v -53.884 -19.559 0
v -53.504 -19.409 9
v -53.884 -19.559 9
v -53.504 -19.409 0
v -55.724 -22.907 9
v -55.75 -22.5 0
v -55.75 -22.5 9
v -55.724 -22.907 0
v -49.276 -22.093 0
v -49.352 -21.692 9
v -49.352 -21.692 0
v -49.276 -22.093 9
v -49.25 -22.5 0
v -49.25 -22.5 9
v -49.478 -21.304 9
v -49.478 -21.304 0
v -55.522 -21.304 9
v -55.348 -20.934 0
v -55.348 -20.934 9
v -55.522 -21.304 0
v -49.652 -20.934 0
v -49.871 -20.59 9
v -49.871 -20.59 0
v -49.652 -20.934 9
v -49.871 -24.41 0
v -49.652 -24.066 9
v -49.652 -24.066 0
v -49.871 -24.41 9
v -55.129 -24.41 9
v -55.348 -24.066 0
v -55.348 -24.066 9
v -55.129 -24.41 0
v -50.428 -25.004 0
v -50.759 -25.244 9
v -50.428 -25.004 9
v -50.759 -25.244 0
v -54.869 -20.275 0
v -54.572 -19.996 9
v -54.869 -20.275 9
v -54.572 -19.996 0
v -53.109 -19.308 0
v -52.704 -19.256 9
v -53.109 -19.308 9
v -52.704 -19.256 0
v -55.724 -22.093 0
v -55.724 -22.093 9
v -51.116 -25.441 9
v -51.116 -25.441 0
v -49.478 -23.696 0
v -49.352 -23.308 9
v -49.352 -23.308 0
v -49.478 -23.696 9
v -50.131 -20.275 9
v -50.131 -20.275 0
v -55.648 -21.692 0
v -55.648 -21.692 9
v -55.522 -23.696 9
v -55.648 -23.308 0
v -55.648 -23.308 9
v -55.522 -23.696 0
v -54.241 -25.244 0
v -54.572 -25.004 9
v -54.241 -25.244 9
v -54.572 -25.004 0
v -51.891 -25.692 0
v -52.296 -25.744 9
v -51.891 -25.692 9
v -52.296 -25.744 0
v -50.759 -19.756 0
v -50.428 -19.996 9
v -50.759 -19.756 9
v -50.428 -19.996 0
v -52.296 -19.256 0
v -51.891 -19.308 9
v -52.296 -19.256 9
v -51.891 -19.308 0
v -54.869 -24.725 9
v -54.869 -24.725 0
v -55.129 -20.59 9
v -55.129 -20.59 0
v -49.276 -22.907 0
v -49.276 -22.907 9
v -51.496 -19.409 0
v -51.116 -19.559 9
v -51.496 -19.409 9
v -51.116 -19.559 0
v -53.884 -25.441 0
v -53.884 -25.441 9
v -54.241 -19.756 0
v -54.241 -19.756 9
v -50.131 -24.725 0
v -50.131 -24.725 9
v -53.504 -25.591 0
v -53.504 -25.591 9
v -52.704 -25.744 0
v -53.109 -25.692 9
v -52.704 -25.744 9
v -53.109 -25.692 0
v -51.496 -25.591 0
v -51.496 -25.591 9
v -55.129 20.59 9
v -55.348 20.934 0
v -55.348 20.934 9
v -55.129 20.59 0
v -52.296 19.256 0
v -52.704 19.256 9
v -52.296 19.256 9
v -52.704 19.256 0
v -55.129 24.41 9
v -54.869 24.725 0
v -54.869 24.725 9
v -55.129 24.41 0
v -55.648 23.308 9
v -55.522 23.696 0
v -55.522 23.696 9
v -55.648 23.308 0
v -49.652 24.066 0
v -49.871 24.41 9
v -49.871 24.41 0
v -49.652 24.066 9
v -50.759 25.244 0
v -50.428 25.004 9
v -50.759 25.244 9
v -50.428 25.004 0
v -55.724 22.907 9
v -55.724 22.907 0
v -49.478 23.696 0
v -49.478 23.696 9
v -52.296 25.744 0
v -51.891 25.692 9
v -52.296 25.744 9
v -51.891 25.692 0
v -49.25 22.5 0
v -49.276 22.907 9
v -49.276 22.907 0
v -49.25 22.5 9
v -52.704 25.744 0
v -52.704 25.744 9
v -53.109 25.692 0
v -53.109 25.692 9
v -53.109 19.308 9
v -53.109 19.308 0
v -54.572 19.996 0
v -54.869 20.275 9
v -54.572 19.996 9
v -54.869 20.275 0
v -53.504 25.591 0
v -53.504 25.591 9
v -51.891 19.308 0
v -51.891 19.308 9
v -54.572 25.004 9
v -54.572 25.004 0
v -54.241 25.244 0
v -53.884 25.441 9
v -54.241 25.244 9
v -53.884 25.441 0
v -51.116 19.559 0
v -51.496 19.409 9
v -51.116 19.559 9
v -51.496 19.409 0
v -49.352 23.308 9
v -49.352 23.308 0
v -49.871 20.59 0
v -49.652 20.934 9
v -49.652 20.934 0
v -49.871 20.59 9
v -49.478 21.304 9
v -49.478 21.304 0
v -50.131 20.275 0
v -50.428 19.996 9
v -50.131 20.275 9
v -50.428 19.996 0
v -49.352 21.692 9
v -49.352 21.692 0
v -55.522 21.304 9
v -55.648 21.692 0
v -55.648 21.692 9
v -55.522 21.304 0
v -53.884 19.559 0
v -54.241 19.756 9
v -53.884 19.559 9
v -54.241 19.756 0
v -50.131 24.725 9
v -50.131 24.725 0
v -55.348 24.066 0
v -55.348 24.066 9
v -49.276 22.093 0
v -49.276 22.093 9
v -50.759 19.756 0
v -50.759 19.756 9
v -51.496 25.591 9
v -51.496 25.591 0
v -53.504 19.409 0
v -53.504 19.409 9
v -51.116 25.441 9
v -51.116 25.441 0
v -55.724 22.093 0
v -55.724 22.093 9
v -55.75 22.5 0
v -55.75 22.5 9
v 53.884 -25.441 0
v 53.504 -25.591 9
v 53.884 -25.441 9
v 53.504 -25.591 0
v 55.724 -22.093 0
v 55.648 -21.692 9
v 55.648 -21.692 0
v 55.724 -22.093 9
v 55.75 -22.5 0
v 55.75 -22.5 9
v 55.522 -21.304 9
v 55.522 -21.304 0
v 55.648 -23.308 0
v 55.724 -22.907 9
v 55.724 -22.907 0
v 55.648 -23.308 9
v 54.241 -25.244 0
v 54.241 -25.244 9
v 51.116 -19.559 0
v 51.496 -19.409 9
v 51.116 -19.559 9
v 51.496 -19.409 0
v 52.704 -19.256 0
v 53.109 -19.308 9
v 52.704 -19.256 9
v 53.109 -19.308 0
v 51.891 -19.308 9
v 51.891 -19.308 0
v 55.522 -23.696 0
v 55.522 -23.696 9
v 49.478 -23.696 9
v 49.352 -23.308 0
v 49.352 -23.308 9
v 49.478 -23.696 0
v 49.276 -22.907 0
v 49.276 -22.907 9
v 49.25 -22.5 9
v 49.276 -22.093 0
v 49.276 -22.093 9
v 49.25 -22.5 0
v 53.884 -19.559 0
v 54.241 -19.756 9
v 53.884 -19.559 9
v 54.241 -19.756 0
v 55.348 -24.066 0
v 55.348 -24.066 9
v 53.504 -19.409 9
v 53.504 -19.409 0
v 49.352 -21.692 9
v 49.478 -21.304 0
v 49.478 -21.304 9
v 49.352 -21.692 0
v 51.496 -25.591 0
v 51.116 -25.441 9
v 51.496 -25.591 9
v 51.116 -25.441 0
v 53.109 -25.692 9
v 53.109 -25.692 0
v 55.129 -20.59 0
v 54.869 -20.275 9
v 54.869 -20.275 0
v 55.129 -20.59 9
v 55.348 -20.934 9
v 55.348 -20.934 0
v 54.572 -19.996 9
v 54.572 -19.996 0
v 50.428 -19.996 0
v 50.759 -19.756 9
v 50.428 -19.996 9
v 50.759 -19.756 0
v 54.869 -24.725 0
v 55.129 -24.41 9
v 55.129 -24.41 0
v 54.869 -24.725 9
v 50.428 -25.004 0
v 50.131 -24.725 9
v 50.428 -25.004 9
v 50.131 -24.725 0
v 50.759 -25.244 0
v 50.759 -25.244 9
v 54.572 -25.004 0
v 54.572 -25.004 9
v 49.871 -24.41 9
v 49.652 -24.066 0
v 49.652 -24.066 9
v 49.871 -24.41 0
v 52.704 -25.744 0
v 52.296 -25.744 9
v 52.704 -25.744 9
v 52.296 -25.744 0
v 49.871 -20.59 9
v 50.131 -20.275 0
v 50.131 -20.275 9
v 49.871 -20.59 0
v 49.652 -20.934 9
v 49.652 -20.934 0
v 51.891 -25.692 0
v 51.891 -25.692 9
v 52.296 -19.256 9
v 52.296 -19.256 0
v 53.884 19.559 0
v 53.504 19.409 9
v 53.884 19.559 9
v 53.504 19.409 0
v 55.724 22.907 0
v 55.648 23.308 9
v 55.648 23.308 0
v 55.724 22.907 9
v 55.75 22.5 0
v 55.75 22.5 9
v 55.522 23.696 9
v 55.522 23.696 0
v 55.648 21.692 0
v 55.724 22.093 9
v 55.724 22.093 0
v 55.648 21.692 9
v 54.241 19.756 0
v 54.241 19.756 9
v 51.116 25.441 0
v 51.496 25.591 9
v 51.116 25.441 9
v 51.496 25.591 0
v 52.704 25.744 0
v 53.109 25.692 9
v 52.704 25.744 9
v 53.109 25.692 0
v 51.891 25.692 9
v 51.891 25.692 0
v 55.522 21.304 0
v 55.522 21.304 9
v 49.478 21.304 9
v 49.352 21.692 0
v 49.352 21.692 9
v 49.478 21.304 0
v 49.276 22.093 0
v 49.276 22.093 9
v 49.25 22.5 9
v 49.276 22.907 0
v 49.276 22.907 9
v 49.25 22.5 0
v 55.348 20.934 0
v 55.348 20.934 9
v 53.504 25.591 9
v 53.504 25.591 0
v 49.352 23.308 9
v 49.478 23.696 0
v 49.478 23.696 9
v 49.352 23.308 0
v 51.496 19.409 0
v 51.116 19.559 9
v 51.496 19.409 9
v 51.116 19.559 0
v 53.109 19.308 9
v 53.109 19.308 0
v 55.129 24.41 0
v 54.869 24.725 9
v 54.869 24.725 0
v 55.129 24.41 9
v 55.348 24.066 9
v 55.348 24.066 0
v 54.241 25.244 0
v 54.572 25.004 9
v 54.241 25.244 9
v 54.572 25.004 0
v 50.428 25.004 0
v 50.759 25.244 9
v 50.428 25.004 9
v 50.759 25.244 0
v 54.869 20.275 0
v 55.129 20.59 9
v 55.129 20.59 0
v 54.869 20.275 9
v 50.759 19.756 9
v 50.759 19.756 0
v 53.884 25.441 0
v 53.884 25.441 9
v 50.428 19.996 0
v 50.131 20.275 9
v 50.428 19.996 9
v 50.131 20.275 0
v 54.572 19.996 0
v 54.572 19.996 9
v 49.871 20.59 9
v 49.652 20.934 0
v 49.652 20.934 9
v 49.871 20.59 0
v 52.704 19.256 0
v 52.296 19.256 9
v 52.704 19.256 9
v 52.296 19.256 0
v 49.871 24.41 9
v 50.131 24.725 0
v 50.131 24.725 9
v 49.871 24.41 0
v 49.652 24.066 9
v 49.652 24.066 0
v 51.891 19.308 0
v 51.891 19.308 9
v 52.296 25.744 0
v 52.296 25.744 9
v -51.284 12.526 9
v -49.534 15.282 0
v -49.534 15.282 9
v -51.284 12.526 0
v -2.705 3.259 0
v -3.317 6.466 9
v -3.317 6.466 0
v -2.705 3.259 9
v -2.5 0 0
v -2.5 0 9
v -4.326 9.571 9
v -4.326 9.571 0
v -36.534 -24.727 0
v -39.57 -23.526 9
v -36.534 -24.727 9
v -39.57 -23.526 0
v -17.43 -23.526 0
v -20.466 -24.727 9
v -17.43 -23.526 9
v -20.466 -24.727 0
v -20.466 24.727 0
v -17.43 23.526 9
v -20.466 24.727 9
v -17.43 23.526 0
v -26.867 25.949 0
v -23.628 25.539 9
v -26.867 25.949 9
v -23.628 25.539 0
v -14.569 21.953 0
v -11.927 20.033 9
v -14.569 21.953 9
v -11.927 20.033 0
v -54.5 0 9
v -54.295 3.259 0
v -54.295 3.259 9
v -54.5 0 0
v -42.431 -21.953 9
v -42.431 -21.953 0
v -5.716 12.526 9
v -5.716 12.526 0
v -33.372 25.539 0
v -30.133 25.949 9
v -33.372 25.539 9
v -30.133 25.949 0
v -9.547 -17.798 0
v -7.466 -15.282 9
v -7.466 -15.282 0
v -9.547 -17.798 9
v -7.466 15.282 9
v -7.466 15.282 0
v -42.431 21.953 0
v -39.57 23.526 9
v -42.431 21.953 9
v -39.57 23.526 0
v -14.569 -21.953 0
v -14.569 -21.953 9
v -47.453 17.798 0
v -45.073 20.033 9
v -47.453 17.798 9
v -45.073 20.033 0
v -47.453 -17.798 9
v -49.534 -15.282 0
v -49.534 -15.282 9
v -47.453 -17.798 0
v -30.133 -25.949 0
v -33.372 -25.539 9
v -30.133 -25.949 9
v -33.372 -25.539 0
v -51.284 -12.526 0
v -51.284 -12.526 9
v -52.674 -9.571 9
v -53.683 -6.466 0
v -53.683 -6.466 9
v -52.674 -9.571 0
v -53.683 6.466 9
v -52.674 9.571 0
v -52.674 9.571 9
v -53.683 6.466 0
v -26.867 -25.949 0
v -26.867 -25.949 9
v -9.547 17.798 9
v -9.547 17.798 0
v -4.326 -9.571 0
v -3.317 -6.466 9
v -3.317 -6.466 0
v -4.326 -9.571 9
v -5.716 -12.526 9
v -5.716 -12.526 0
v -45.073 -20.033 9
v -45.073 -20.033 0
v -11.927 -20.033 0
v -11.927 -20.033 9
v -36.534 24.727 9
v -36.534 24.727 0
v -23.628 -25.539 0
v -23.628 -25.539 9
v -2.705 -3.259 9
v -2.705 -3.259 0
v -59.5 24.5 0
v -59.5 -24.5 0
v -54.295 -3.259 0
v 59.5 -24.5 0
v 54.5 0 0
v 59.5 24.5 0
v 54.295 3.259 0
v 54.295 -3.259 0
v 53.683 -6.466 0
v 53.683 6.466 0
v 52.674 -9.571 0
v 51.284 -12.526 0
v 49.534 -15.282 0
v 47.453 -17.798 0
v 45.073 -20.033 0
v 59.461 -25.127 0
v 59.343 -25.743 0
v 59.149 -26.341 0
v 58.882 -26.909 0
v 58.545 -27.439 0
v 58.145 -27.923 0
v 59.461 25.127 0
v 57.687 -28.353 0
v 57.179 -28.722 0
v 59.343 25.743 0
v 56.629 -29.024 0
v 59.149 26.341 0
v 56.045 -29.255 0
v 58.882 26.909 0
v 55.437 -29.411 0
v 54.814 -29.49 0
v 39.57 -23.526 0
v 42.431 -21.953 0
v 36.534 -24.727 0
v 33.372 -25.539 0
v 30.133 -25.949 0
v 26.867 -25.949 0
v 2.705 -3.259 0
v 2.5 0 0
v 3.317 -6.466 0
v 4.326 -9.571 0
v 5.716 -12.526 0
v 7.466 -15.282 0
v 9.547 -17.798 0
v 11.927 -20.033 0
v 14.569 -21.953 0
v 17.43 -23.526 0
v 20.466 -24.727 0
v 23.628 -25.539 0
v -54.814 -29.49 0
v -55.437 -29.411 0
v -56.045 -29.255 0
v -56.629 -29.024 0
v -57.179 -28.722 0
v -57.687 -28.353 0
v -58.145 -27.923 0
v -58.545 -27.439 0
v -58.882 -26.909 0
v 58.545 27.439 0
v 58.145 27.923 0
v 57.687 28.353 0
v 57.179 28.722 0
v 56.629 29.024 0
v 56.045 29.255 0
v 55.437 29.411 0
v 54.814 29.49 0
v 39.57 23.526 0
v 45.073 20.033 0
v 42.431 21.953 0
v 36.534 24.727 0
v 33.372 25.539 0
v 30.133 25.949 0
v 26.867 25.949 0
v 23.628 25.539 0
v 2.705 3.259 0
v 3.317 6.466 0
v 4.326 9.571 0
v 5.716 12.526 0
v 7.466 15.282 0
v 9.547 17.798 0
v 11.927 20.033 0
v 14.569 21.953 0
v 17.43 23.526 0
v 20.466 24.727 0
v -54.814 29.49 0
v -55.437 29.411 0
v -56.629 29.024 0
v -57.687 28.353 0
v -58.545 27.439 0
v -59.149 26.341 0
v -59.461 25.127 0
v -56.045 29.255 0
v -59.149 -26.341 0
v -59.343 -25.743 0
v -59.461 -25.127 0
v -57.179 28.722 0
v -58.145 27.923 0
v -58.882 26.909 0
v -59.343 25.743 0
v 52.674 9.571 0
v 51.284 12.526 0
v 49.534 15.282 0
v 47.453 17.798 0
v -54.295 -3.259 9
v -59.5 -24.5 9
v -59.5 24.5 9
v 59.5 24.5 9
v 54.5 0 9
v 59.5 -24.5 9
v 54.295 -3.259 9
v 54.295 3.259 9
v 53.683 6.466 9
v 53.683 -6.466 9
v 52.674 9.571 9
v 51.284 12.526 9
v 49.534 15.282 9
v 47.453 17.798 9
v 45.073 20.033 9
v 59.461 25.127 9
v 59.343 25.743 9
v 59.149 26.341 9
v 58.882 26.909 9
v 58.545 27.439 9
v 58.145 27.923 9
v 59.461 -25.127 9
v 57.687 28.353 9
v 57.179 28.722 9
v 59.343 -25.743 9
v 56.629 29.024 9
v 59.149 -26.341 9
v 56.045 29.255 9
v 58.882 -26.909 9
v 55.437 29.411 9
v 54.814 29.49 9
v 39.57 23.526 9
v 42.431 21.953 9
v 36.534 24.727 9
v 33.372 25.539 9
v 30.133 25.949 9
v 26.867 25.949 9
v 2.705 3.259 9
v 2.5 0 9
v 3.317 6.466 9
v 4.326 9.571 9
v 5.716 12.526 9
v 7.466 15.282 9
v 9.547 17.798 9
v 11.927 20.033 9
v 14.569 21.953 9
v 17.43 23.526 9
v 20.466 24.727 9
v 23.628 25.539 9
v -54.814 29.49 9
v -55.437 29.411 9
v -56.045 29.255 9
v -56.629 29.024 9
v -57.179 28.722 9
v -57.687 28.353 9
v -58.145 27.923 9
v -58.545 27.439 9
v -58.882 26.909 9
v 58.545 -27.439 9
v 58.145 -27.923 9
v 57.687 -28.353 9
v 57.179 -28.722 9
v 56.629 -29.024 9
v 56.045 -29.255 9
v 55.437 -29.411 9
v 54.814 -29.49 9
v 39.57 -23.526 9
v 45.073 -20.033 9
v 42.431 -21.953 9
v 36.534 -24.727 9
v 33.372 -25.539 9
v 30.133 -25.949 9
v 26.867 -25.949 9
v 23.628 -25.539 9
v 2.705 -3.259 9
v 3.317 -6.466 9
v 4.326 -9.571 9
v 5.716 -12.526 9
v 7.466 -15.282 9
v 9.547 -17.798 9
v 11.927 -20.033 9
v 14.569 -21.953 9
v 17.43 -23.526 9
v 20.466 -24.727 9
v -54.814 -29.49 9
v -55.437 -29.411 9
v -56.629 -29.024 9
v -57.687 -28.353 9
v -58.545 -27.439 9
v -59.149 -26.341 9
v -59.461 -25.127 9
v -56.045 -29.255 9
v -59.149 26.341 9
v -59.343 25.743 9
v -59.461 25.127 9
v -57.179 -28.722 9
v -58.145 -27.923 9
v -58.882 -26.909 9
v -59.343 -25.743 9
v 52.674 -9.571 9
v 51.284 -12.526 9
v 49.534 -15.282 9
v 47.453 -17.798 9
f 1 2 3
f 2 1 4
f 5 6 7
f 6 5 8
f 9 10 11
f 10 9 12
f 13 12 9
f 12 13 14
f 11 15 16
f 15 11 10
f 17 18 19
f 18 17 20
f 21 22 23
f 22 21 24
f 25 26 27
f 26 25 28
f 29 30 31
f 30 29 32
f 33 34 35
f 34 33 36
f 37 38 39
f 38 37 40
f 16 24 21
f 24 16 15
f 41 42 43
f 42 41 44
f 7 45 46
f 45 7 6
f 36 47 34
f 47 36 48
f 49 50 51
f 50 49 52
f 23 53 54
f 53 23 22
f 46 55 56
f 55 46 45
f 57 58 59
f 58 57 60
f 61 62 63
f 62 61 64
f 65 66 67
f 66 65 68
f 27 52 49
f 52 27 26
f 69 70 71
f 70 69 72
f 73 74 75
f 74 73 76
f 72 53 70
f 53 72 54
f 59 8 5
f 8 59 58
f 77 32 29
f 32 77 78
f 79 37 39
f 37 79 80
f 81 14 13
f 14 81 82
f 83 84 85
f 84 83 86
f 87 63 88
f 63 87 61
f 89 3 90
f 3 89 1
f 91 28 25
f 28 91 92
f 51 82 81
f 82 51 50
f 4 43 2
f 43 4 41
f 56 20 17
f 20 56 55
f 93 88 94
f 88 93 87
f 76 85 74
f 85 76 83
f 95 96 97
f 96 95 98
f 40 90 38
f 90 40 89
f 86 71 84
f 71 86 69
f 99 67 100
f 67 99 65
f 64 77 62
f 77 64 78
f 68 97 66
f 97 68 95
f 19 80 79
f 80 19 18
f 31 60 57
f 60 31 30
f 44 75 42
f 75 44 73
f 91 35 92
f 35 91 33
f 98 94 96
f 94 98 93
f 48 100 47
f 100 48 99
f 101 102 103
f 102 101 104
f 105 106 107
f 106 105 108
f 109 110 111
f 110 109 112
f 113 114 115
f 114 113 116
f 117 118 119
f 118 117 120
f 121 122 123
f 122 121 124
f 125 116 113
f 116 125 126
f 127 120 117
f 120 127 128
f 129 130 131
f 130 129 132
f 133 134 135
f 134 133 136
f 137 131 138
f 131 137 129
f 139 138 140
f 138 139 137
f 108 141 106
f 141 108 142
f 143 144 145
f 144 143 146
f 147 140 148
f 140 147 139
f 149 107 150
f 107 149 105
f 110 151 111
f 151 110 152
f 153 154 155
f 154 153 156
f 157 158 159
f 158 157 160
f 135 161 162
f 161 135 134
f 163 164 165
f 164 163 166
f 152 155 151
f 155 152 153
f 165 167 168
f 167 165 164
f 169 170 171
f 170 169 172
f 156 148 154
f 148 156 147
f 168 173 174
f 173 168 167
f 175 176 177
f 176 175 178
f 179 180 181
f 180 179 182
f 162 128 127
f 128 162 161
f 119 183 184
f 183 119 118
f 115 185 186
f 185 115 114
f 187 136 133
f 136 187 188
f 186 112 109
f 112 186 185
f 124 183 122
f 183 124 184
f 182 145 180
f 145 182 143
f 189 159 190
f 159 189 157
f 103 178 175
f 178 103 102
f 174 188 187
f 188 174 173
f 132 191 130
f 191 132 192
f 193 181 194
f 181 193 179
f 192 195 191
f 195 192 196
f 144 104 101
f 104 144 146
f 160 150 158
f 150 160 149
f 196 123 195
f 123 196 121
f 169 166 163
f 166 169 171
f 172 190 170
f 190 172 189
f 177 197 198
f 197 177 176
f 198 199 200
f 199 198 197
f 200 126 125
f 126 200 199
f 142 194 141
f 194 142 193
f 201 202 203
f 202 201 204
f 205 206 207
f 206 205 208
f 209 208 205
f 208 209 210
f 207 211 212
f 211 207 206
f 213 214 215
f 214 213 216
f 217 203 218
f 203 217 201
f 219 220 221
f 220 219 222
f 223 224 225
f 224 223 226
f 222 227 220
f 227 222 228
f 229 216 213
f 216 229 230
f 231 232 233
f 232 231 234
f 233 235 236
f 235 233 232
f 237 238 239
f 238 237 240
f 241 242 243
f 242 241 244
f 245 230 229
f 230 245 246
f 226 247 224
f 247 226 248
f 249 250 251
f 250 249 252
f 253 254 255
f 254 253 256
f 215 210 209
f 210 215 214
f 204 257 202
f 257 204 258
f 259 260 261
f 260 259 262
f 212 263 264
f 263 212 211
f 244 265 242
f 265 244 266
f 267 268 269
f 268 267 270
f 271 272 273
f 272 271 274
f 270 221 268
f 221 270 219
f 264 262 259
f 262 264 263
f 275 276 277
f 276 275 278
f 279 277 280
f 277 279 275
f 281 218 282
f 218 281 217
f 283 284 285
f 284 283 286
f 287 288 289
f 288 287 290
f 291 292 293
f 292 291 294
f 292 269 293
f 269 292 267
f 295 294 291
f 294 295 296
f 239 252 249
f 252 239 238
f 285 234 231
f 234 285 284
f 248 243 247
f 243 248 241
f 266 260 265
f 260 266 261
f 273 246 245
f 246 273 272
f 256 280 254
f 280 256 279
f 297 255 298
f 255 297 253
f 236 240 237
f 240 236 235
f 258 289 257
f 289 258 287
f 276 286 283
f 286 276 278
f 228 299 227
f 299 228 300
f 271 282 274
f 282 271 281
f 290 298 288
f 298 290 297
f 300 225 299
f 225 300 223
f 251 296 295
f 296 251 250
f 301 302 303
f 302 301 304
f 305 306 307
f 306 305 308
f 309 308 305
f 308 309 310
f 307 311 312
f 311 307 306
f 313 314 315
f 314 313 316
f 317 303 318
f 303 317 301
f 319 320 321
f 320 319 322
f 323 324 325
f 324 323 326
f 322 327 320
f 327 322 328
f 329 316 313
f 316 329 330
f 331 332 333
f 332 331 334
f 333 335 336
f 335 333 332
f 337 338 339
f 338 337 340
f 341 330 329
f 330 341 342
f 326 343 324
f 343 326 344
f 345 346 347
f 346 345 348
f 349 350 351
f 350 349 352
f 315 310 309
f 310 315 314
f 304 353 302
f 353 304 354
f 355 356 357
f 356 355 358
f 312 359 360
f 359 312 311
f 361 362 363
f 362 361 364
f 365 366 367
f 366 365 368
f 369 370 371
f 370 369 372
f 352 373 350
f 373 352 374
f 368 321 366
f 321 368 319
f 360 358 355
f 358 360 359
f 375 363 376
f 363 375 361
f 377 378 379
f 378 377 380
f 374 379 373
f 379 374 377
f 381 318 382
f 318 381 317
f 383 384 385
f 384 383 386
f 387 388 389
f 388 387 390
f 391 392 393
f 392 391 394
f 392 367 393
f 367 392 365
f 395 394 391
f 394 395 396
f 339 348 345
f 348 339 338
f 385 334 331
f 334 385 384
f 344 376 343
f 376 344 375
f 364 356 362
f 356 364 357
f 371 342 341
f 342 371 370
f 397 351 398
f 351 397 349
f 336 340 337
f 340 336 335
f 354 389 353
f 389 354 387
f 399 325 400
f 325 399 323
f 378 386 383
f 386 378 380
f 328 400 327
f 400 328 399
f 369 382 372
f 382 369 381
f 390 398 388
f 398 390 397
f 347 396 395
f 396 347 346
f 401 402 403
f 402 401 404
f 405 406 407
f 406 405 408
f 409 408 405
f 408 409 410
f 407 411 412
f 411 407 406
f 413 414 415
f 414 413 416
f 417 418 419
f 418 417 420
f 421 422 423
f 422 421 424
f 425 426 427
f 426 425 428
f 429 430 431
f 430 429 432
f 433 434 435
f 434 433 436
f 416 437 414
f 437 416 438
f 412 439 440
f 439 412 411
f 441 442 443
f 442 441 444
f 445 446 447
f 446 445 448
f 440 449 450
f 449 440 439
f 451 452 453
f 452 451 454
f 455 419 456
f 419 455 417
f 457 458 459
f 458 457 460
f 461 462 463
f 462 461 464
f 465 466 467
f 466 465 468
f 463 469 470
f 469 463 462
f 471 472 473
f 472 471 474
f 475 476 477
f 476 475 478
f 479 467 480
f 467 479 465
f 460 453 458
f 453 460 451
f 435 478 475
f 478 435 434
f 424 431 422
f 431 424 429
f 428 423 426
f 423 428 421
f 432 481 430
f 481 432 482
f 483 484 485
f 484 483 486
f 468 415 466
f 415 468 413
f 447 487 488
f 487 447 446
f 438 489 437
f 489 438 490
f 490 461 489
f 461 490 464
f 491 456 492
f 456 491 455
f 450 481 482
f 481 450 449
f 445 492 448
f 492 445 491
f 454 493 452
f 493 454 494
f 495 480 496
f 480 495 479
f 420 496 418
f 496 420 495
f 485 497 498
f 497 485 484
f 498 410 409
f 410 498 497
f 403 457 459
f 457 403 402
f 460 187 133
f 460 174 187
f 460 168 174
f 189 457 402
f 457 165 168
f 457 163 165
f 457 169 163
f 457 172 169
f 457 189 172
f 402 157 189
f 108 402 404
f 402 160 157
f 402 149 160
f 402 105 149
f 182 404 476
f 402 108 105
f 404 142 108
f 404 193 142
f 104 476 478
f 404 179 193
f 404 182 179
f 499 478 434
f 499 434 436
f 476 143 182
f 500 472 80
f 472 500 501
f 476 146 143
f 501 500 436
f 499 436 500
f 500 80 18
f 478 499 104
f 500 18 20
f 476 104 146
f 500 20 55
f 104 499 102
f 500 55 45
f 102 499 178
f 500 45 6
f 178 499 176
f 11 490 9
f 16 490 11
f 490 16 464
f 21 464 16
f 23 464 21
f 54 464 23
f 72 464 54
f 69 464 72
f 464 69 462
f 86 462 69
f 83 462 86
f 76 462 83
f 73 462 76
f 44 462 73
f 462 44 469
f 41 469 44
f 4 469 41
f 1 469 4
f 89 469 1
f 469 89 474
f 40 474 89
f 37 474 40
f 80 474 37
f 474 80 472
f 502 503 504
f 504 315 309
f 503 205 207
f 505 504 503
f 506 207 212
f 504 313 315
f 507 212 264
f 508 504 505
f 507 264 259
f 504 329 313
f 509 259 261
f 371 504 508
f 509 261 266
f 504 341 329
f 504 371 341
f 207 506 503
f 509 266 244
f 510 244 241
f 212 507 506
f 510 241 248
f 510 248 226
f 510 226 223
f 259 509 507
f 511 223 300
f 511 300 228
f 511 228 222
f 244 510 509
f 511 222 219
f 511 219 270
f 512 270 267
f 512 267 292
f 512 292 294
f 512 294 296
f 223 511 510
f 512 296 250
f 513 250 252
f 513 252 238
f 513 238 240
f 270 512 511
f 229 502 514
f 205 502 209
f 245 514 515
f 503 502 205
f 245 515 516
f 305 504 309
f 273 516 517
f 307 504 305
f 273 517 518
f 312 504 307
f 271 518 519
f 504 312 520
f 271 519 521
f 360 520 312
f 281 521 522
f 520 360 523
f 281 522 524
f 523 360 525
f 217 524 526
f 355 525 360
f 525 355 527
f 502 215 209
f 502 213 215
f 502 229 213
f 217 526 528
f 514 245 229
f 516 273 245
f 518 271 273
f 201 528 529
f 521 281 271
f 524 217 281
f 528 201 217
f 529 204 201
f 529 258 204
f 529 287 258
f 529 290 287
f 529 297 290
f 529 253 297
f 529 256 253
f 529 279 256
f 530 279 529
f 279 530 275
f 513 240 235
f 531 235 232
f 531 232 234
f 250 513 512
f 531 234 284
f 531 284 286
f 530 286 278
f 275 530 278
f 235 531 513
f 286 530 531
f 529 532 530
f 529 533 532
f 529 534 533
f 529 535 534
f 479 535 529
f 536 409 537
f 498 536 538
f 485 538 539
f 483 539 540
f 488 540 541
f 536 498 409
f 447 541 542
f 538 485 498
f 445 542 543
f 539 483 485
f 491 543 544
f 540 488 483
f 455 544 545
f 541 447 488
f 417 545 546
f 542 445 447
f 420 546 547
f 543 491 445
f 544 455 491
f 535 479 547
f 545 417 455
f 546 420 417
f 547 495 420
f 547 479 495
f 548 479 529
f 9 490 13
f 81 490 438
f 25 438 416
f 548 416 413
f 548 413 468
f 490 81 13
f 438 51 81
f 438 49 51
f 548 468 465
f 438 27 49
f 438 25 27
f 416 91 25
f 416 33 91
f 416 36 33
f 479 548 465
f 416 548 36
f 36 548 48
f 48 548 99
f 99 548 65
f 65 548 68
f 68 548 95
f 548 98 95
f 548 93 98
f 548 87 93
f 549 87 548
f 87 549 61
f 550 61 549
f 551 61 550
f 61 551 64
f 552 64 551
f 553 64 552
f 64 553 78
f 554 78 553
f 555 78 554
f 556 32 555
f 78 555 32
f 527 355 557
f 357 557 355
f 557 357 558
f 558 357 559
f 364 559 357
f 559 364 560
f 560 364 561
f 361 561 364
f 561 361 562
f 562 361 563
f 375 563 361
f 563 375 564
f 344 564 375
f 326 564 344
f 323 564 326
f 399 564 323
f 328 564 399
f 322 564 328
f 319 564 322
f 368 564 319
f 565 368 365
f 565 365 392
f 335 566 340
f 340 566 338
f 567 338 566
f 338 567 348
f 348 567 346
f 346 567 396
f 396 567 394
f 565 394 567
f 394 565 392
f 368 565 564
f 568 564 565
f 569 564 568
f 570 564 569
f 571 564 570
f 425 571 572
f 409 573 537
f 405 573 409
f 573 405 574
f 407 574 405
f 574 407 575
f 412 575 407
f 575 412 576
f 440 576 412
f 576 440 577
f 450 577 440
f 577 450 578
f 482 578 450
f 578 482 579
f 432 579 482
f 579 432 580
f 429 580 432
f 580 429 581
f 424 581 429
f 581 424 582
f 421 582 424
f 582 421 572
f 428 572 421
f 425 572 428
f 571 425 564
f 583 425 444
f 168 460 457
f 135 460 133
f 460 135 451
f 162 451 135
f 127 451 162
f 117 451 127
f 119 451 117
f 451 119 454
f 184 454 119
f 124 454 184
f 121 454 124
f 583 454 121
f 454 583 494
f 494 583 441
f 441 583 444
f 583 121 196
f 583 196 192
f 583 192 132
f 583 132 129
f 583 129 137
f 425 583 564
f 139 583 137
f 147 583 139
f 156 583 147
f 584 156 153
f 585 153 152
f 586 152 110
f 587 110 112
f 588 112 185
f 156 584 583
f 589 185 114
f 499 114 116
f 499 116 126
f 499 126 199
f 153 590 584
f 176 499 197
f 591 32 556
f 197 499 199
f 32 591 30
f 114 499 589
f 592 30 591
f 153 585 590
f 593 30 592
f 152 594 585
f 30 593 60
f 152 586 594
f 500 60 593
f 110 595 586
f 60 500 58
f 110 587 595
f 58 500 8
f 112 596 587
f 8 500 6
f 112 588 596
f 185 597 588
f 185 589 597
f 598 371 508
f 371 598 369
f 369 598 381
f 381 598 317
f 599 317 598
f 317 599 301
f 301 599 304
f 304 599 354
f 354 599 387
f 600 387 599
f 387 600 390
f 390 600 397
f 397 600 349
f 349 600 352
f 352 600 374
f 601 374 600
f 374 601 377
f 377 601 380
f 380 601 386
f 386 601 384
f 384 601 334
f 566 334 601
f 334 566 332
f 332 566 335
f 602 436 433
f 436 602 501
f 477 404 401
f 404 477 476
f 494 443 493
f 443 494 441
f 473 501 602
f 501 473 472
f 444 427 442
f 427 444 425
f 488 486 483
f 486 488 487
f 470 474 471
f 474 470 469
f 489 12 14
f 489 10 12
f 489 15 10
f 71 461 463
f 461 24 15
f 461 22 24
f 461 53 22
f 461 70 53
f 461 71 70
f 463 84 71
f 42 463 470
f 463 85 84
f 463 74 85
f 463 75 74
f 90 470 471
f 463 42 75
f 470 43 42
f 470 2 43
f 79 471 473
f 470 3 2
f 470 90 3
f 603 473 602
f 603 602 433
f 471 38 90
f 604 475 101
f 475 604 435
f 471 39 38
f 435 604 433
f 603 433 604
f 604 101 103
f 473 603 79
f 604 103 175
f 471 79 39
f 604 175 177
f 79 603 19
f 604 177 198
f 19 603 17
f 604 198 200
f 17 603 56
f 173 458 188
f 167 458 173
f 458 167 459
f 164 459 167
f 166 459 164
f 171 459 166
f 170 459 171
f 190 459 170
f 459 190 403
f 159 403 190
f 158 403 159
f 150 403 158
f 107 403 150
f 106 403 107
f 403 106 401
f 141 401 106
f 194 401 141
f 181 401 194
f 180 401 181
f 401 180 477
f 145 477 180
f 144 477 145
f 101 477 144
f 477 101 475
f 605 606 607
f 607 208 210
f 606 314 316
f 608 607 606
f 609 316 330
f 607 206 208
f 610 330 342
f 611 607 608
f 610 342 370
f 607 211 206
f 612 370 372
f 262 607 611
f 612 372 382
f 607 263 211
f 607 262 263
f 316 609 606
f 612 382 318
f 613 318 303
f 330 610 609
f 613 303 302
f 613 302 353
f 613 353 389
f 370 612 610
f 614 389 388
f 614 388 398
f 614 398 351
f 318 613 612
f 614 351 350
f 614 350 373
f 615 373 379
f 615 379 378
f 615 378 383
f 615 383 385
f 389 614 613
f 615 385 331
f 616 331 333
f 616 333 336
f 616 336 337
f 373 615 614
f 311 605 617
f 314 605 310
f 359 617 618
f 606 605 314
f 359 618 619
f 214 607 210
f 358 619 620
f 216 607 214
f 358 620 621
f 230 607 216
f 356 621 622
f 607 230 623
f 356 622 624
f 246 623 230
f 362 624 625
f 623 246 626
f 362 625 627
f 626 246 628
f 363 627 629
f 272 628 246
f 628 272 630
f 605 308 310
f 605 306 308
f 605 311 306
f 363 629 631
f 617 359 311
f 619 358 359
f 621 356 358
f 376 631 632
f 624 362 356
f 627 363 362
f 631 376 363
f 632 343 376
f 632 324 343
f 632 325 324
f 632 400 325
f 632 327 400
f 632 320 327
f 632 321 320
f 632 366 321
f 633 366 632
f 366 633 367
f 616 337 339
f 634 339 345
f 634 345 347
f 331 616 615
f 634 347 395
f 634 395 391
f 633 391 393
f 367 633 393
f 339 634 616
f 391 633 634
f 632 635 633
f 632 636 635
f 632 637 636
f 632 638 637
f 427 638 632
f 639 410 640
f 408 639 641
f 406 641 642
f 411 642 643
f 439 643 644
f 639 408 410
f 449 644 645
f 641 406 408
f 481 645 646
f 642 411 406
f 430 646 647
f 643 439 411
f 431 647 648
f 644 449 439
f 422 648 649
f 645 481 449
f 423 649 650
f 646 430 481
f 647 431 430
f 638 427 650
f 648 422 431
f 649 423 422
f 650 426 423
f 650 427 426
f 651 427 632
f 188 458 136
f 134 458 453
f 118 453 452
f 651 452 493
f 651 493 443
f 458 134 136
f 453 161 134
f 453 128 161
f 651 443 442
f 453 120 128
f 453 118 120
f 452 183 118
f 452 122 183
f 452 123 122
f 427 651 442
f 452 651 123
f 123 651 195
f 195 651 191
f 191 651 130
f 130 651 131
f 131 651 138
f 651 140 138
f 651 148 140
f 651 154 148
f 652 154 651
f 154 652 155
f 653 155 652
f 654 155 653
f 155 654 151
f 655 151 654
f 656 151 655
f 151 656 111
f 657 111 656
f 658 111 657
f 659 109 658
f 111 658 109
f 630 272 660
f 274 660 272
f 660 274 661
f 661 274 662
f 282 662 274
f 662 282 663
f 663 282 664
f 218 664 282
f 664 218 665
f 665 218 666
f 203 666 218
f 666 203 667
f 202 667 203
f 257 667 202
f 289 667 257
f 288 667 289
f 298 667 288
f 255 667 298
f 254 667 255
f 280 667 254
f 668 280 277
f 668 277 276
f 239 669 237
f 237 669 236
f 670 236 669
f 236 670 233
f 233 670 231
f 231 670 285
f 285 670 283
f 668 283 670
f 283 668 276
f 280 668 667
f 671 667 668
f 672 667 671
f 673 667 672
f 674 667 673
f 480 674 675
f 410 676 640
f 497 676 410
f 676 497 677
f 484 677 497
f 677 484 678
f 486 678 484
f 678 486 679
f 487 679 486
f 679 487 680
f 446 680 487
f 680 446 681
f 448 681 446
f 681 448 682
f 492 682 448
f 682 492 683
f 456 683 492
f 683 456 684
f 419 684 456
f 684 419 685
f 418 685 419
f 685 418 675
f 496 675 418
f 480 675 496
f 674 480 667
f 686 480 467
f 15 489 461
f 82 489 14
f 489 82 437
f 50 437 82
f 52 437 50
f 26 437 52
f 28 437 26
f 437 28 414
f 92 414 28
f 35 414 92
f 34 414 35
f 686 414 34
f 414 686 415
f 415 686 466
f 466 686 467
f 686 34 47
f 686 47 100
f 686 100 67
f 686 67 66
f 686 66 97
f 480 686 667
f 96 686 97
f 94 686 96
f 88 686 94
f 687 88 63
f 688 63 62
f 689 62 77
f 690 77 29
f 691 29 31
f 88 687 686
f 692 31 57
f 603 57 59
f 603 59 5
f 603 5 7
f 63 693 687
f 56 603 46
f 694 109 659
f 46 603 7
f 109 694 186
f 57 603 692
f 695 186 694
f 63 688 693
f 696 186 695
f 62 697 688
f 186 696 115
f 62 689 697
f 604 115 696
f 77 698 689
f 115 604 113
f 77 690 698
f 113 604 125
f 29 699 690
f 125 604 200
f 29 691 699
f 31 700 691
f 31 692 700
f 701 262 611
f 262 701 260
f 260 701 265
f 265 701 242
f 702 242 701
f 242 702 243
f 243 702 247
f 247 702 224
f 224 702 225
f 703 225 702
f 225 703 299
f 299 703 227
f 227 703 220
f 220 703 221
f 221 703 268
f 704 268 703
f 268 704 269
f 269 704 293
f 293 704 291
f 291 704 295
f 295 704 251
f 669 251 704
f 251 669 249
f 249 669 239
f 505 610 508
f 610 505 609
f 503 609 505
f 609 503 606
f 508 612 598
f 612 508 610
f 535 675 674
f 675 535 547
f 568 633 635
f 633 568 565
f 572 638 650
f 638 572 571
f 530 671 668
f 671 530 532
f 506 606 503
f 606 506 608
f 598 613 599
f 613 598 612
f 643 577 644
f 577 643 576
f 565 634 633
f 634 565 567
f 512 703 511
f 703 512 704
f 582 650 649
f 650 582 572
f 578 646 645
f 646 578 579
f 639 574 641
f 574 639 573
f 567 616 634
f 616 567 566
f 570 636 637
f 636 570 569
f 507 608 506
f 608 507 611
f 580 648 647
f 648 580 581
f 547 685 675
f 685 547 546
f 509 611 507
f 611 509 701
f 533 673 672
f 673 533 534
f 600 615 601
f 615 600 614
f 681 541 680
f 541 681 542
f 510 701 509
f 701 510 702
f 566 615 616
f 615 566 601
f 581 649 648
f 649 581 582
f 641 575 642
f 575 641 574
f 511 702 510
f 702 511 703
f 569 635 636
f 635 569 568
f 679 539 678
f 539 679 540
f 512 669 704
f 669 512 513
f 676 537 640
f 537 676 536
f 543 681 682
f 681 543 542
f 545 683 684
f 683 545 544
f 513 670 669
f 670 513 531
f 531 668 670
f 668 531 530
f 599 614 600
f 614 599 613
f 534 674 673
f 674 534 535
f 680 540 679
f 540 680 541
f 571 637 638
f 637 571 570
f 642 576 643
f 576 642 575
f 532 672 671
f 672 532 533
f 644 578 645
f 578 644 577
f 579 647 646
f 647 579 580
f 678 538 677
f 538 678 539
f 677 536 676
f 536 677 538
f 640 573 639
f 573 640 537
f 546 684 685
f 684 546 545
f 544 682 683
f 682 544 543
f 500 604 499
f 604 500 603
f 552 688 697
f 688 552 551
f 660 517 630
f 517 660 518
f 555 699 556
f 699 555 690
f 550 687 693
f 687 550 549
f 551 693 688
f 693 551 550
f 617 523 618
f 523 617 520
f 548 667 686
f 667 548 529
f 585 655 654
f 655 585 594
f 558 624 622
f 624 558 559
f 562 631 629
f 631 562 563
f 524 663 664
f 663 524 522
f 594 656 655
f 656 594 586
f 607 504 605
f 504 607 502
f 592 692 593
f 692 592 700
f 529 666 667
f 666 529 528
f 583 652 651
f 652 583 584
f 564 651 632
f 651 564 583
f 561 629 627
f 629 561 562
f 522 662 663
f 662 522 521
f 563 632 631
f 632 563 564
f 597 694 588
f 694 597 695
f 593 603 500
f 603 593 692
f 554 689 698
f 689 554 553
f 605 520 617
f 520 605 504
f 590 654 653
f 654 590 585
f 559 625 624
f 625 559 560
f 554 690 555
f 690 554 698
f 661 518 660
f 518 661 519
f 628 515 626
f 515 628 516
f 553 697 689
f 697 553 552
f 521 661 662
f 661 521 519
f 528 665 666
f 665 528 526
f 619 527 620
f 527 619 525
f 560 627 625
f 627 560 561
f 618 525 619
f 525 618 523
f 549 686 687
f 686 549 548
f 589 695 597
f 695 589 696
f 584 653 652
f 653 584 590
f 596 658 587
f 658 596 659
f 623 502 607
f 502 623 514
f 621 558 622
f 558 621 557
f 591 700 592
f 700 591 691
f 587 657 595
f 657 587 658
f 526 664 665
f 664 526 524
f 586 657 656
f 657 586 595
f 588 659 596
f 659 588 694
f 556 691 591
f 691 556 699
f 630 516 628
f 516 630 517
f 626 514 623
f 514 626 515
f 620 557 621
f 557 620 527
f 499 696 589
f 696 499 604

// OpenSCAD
$fn = 50;

difference() {
	union() {
		hull() {
			translate(v = [-54.5, 24.5, 0]) {
				cylinder(h = 9, r = 5);
			}
			translate(v = [54.5, 24.5, 0]) {
				cylinder(h = 9, r = 5);
			}
			translate(v = [-54.5, -24.5, 0]) {
				cylinder(h = 9, r = 5);
			}
			translate(v = [54.5, -24.5, 0]) {
				cylinder(h = 9, r = 5);
			}
		}
	}
	union() {
		translate(v = [-52.5, -22.5, -100.0]) {
			cylinder(h = 200, r = 3.25);
		}
		translate(v = [-52.5, 22.5, -100.0]) {
			cylinder(h = 200, r = 3.25);
		}
		translate(v = [52.5, -22.5, -100.0]) {
			cylinder(h = 200, r = 3.25);
		}
		translate(v = [52.5, 22.5, -100.0]) {
			cylinder(h = 200, r = 3.25);
		}
		translate(v = [-52.5, -22.5, -100.0]) {
			cylinder(h = 200, r = 1.8);
		}
		translate(v = [-52.5, 22.5, -100.0]) {
			cylinder(h = 200, r = 1.8);
		}
		translate(v = [52.5, -22.5, -100.0]) {
			cylinder(h = 200, r = 1.8);
		}
		translate(v = [52.5, 22.5, -100.0]) {
			cylinder(h = 200, r = 1.8);
		}
		translate(v = [-28.5, 0, 0.0]) {
			cylinder(h = 9, r = 26.0);
		}
		translate(v = [28.5, 0, 0.0]) {
			cylinder(h = 9, r = 26.0);
		}
	}
}
